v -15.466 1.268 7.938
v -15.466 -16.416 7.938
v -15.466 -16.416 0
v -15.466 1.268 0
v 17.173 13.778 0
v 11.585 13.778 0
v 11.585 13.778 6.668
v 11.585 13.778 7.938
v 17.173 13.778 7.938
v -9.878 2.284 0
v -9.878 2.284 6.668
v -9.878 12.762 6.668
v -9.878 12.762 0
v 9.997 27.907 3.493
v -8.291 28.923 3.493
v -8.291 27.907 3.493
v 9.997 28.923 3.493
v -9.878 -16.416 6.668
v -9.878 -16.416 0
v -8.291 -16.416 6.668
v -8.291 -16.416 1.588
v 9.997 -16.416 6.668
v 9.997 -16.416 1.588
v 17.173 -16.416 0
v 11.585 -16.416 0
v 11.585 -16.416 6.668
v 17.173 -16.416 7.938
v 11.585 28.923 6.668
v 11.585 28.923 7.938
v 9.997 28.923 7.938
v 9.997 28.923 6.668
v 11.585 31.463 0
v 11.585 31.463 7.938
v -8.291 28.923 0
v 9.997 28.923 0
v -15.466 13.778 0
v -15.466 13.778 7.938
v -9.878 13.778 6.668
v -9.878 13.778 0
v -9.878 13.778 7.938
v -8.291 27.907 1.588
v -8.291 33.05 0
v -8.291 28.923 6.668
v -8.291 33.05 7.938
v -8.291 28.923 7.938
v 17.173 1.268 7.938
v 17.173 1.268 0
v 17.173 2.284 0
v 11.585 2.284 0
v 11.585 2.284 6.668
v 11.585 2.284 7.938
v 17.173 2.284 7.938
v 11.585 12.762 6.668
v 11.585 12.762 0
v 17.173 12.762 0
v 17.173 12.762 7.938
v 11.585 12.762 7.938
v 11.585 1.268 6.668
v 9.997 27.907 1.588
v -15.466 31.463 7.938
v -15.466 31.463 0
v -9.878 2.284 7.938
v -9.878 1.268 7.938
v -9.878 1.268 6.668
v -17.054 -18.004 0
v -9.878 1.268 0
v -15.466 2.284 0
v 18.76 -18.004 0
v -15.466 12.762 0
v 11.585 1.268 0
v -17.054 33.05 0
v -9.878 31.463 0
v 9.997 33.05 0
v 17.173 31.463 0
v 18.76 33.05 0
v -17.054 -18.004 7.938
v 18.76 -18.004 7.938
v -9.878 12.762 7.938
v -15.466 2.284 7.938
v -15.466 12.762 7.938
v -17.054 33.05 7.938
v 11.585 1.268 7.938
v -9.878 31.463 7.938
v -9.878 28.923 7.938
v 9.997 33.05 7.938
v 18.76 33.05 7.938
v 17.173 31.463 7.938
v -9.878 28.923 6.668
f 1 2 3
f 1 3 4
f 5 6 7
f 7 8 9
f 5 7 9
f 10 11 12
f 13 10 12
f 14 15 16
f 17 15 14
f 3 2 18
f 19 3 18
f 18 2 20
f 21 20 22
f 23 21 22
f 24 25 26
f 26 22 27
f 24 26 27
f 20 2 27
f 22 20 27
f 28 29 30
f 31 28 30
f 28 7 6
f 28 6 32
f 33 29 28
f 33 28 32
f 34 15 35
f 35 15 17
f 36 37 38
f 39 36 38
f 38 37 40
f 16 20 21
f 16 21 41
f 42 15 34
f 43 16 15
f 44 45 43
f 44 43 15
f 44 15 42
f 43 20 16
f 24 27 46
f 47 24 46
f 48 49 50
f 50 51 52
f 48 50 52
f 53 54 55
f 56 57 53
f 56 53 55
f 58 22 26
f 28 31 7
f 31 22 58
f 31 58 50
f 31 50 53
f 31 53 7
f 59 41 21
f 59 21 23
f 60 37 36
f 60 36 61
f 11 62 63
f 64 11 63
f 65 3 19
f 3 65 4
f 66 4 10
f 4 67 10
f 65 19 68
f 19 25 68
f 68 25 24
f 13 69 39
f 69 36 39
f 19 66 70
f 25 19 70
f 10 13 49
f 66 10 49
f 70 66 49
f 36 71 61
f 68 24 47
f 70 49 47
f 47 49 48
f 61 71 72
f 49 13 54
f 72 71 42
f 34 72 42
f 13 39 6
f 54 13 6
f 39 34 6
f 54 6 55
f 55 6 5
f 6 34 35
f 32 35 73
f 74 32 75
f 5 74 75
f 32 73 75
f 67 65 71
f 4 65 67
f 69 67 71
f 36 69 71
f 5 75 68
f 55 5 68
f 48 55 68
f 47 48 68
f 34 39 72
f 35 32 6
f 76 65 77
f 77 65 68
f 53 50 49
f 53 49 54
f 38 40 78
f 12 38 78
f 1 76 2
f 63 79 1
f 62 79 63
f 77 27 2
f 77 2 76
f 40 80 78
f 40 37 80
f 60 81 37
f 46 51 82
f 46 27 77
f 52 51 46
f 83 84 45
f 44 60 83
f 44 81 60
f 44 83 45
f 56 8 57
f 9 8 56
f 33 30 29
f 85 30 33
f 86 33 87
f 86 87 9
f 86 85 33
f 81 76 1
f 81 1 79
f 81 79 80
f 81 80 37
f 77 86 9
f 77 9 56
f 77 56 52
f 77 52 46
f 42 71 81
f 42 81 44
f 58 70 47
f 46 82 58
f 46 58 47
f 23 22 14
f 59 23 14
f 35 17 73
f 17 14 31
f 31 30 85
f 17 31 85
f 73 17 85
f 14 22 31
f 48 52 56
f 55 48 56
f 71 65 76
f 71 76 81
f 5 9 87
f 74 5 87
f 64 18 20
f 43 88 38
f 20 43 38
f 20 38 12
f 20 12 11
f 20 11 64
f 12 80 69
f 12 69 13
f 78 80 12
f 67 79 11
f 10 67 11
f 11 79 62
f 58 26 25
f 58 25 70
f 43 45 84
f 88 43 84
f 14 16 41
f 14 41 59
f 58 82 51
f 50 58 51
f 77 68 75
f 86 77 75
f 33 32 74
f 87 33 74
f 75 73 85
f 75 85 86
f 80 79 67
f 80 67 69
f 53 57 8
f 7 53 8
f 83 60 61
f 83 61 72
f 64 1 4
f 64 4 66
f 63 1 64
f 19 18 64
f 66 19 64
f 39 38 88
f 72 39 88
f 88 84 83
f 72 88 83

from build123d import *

# Parameters (mm, degrees)
F0_W      = 35.814
F0_H      = 51.054
F1_DEPTH  = 7.9375
F2_W      = 5.588
F2_H      = 17.68475
F2_H_2    = 10.4775
F3_DEPTH  = 25.4
F5_DEPTH  = 1.27
F6_W      = 18.288
F6_H      = 44.323
F7_DEPTH  = 5.08
F8_W      = 18.288
F8_H      = 4.1275
F9_DEPTH  = 25.4
F10_W     = 18.288
F10_H     = 1.016
F11_DEPTH = 3.175


with BuildPart() as f1:
    # F0 (on Top) → F1 (new body)
    with BuildSketch(Plane.XY):
        with Locations((0.853188, 7.523157)):
            Rectangle(F0_W, F0_H)
    extrude(amount=F1_DEPTH)

    # F2 (on face) → F3 (cut)
    with BuildSketch(Plane.XY.offset(7.9375)):
        with Locations((-12.672312, 22.620282)):
            Rectangle(F2_W, F2_H)
        with Locations((-12.672312, 7.523157)):
            Rectangle(F2_W, F2_H_2)
        with Locations((-12.672312, -7.573968)):
            Rectangle(F2_W, F2_H)
        with Locations((14.378688, -7.573968)):
            Rectangle(F2_W, F2_H)
        with Locations((14.378688, 7.523157)):
            Rectangle(F2_W, F2_H_2)
        with Locations((14.378688, 22.620282)):
            Rectangle(F2_W, F2_H)
    extrude(amount=-F3_DEPTH, mode=Mode.SUBTRACT)

    # F4 (on face) → F5 (cut)
    with BuildSketch(Plane.XY.offset(7.9375)):
        Polygon((11.584688, 28.922657), (-9.878312, 28.922657), (-9.878312, 13.777907), (-9.878312, 12.761907), (-9.878312, 2.284407), (-9.878312, 1.268407), (-9.878312, -16.416343), (11.584688, -16.416343), (11.584688, 1.268407), (11.584688, 2.284407), (11.584688, 12.761907), (11.584688, 13.777907), align=None)
    extrude(amount=-F5_DEPTH, mode=Mode.SUBTRACT)

    # F6 (on face) → F7 (cut)
    with BuildSketch(Plane.XY.offset(6.6675)):
        with Locations((0.853188, 5.745157)):
            Rectangle(F6_W, F6_H)
    extrude(amount=-F7_DEPTH, mode=Mode.SUBTRACT)

    # F8 (on face) → F9 (cut)
    with BuildSketch(Plane.XY.offset(7.9375)):
        with Locations((0.853188, 30.986407)):
            Rectangle(F8_W, F8_H)
    extrude(amount=-F9_DEPTH, mode=Mode.SUBTRACT)

    # F10 (on face) → F11 (cut)
    with BuildSketch(Plane.XY.offset(6.6675)):
        with Locations((0.853188, 28.414657)):
            Rectangle(F10_W, F10_H)
    extrude(amount=-F11_DEPTH, mode=Mode.SUBTRACT)


solid = f1.part
